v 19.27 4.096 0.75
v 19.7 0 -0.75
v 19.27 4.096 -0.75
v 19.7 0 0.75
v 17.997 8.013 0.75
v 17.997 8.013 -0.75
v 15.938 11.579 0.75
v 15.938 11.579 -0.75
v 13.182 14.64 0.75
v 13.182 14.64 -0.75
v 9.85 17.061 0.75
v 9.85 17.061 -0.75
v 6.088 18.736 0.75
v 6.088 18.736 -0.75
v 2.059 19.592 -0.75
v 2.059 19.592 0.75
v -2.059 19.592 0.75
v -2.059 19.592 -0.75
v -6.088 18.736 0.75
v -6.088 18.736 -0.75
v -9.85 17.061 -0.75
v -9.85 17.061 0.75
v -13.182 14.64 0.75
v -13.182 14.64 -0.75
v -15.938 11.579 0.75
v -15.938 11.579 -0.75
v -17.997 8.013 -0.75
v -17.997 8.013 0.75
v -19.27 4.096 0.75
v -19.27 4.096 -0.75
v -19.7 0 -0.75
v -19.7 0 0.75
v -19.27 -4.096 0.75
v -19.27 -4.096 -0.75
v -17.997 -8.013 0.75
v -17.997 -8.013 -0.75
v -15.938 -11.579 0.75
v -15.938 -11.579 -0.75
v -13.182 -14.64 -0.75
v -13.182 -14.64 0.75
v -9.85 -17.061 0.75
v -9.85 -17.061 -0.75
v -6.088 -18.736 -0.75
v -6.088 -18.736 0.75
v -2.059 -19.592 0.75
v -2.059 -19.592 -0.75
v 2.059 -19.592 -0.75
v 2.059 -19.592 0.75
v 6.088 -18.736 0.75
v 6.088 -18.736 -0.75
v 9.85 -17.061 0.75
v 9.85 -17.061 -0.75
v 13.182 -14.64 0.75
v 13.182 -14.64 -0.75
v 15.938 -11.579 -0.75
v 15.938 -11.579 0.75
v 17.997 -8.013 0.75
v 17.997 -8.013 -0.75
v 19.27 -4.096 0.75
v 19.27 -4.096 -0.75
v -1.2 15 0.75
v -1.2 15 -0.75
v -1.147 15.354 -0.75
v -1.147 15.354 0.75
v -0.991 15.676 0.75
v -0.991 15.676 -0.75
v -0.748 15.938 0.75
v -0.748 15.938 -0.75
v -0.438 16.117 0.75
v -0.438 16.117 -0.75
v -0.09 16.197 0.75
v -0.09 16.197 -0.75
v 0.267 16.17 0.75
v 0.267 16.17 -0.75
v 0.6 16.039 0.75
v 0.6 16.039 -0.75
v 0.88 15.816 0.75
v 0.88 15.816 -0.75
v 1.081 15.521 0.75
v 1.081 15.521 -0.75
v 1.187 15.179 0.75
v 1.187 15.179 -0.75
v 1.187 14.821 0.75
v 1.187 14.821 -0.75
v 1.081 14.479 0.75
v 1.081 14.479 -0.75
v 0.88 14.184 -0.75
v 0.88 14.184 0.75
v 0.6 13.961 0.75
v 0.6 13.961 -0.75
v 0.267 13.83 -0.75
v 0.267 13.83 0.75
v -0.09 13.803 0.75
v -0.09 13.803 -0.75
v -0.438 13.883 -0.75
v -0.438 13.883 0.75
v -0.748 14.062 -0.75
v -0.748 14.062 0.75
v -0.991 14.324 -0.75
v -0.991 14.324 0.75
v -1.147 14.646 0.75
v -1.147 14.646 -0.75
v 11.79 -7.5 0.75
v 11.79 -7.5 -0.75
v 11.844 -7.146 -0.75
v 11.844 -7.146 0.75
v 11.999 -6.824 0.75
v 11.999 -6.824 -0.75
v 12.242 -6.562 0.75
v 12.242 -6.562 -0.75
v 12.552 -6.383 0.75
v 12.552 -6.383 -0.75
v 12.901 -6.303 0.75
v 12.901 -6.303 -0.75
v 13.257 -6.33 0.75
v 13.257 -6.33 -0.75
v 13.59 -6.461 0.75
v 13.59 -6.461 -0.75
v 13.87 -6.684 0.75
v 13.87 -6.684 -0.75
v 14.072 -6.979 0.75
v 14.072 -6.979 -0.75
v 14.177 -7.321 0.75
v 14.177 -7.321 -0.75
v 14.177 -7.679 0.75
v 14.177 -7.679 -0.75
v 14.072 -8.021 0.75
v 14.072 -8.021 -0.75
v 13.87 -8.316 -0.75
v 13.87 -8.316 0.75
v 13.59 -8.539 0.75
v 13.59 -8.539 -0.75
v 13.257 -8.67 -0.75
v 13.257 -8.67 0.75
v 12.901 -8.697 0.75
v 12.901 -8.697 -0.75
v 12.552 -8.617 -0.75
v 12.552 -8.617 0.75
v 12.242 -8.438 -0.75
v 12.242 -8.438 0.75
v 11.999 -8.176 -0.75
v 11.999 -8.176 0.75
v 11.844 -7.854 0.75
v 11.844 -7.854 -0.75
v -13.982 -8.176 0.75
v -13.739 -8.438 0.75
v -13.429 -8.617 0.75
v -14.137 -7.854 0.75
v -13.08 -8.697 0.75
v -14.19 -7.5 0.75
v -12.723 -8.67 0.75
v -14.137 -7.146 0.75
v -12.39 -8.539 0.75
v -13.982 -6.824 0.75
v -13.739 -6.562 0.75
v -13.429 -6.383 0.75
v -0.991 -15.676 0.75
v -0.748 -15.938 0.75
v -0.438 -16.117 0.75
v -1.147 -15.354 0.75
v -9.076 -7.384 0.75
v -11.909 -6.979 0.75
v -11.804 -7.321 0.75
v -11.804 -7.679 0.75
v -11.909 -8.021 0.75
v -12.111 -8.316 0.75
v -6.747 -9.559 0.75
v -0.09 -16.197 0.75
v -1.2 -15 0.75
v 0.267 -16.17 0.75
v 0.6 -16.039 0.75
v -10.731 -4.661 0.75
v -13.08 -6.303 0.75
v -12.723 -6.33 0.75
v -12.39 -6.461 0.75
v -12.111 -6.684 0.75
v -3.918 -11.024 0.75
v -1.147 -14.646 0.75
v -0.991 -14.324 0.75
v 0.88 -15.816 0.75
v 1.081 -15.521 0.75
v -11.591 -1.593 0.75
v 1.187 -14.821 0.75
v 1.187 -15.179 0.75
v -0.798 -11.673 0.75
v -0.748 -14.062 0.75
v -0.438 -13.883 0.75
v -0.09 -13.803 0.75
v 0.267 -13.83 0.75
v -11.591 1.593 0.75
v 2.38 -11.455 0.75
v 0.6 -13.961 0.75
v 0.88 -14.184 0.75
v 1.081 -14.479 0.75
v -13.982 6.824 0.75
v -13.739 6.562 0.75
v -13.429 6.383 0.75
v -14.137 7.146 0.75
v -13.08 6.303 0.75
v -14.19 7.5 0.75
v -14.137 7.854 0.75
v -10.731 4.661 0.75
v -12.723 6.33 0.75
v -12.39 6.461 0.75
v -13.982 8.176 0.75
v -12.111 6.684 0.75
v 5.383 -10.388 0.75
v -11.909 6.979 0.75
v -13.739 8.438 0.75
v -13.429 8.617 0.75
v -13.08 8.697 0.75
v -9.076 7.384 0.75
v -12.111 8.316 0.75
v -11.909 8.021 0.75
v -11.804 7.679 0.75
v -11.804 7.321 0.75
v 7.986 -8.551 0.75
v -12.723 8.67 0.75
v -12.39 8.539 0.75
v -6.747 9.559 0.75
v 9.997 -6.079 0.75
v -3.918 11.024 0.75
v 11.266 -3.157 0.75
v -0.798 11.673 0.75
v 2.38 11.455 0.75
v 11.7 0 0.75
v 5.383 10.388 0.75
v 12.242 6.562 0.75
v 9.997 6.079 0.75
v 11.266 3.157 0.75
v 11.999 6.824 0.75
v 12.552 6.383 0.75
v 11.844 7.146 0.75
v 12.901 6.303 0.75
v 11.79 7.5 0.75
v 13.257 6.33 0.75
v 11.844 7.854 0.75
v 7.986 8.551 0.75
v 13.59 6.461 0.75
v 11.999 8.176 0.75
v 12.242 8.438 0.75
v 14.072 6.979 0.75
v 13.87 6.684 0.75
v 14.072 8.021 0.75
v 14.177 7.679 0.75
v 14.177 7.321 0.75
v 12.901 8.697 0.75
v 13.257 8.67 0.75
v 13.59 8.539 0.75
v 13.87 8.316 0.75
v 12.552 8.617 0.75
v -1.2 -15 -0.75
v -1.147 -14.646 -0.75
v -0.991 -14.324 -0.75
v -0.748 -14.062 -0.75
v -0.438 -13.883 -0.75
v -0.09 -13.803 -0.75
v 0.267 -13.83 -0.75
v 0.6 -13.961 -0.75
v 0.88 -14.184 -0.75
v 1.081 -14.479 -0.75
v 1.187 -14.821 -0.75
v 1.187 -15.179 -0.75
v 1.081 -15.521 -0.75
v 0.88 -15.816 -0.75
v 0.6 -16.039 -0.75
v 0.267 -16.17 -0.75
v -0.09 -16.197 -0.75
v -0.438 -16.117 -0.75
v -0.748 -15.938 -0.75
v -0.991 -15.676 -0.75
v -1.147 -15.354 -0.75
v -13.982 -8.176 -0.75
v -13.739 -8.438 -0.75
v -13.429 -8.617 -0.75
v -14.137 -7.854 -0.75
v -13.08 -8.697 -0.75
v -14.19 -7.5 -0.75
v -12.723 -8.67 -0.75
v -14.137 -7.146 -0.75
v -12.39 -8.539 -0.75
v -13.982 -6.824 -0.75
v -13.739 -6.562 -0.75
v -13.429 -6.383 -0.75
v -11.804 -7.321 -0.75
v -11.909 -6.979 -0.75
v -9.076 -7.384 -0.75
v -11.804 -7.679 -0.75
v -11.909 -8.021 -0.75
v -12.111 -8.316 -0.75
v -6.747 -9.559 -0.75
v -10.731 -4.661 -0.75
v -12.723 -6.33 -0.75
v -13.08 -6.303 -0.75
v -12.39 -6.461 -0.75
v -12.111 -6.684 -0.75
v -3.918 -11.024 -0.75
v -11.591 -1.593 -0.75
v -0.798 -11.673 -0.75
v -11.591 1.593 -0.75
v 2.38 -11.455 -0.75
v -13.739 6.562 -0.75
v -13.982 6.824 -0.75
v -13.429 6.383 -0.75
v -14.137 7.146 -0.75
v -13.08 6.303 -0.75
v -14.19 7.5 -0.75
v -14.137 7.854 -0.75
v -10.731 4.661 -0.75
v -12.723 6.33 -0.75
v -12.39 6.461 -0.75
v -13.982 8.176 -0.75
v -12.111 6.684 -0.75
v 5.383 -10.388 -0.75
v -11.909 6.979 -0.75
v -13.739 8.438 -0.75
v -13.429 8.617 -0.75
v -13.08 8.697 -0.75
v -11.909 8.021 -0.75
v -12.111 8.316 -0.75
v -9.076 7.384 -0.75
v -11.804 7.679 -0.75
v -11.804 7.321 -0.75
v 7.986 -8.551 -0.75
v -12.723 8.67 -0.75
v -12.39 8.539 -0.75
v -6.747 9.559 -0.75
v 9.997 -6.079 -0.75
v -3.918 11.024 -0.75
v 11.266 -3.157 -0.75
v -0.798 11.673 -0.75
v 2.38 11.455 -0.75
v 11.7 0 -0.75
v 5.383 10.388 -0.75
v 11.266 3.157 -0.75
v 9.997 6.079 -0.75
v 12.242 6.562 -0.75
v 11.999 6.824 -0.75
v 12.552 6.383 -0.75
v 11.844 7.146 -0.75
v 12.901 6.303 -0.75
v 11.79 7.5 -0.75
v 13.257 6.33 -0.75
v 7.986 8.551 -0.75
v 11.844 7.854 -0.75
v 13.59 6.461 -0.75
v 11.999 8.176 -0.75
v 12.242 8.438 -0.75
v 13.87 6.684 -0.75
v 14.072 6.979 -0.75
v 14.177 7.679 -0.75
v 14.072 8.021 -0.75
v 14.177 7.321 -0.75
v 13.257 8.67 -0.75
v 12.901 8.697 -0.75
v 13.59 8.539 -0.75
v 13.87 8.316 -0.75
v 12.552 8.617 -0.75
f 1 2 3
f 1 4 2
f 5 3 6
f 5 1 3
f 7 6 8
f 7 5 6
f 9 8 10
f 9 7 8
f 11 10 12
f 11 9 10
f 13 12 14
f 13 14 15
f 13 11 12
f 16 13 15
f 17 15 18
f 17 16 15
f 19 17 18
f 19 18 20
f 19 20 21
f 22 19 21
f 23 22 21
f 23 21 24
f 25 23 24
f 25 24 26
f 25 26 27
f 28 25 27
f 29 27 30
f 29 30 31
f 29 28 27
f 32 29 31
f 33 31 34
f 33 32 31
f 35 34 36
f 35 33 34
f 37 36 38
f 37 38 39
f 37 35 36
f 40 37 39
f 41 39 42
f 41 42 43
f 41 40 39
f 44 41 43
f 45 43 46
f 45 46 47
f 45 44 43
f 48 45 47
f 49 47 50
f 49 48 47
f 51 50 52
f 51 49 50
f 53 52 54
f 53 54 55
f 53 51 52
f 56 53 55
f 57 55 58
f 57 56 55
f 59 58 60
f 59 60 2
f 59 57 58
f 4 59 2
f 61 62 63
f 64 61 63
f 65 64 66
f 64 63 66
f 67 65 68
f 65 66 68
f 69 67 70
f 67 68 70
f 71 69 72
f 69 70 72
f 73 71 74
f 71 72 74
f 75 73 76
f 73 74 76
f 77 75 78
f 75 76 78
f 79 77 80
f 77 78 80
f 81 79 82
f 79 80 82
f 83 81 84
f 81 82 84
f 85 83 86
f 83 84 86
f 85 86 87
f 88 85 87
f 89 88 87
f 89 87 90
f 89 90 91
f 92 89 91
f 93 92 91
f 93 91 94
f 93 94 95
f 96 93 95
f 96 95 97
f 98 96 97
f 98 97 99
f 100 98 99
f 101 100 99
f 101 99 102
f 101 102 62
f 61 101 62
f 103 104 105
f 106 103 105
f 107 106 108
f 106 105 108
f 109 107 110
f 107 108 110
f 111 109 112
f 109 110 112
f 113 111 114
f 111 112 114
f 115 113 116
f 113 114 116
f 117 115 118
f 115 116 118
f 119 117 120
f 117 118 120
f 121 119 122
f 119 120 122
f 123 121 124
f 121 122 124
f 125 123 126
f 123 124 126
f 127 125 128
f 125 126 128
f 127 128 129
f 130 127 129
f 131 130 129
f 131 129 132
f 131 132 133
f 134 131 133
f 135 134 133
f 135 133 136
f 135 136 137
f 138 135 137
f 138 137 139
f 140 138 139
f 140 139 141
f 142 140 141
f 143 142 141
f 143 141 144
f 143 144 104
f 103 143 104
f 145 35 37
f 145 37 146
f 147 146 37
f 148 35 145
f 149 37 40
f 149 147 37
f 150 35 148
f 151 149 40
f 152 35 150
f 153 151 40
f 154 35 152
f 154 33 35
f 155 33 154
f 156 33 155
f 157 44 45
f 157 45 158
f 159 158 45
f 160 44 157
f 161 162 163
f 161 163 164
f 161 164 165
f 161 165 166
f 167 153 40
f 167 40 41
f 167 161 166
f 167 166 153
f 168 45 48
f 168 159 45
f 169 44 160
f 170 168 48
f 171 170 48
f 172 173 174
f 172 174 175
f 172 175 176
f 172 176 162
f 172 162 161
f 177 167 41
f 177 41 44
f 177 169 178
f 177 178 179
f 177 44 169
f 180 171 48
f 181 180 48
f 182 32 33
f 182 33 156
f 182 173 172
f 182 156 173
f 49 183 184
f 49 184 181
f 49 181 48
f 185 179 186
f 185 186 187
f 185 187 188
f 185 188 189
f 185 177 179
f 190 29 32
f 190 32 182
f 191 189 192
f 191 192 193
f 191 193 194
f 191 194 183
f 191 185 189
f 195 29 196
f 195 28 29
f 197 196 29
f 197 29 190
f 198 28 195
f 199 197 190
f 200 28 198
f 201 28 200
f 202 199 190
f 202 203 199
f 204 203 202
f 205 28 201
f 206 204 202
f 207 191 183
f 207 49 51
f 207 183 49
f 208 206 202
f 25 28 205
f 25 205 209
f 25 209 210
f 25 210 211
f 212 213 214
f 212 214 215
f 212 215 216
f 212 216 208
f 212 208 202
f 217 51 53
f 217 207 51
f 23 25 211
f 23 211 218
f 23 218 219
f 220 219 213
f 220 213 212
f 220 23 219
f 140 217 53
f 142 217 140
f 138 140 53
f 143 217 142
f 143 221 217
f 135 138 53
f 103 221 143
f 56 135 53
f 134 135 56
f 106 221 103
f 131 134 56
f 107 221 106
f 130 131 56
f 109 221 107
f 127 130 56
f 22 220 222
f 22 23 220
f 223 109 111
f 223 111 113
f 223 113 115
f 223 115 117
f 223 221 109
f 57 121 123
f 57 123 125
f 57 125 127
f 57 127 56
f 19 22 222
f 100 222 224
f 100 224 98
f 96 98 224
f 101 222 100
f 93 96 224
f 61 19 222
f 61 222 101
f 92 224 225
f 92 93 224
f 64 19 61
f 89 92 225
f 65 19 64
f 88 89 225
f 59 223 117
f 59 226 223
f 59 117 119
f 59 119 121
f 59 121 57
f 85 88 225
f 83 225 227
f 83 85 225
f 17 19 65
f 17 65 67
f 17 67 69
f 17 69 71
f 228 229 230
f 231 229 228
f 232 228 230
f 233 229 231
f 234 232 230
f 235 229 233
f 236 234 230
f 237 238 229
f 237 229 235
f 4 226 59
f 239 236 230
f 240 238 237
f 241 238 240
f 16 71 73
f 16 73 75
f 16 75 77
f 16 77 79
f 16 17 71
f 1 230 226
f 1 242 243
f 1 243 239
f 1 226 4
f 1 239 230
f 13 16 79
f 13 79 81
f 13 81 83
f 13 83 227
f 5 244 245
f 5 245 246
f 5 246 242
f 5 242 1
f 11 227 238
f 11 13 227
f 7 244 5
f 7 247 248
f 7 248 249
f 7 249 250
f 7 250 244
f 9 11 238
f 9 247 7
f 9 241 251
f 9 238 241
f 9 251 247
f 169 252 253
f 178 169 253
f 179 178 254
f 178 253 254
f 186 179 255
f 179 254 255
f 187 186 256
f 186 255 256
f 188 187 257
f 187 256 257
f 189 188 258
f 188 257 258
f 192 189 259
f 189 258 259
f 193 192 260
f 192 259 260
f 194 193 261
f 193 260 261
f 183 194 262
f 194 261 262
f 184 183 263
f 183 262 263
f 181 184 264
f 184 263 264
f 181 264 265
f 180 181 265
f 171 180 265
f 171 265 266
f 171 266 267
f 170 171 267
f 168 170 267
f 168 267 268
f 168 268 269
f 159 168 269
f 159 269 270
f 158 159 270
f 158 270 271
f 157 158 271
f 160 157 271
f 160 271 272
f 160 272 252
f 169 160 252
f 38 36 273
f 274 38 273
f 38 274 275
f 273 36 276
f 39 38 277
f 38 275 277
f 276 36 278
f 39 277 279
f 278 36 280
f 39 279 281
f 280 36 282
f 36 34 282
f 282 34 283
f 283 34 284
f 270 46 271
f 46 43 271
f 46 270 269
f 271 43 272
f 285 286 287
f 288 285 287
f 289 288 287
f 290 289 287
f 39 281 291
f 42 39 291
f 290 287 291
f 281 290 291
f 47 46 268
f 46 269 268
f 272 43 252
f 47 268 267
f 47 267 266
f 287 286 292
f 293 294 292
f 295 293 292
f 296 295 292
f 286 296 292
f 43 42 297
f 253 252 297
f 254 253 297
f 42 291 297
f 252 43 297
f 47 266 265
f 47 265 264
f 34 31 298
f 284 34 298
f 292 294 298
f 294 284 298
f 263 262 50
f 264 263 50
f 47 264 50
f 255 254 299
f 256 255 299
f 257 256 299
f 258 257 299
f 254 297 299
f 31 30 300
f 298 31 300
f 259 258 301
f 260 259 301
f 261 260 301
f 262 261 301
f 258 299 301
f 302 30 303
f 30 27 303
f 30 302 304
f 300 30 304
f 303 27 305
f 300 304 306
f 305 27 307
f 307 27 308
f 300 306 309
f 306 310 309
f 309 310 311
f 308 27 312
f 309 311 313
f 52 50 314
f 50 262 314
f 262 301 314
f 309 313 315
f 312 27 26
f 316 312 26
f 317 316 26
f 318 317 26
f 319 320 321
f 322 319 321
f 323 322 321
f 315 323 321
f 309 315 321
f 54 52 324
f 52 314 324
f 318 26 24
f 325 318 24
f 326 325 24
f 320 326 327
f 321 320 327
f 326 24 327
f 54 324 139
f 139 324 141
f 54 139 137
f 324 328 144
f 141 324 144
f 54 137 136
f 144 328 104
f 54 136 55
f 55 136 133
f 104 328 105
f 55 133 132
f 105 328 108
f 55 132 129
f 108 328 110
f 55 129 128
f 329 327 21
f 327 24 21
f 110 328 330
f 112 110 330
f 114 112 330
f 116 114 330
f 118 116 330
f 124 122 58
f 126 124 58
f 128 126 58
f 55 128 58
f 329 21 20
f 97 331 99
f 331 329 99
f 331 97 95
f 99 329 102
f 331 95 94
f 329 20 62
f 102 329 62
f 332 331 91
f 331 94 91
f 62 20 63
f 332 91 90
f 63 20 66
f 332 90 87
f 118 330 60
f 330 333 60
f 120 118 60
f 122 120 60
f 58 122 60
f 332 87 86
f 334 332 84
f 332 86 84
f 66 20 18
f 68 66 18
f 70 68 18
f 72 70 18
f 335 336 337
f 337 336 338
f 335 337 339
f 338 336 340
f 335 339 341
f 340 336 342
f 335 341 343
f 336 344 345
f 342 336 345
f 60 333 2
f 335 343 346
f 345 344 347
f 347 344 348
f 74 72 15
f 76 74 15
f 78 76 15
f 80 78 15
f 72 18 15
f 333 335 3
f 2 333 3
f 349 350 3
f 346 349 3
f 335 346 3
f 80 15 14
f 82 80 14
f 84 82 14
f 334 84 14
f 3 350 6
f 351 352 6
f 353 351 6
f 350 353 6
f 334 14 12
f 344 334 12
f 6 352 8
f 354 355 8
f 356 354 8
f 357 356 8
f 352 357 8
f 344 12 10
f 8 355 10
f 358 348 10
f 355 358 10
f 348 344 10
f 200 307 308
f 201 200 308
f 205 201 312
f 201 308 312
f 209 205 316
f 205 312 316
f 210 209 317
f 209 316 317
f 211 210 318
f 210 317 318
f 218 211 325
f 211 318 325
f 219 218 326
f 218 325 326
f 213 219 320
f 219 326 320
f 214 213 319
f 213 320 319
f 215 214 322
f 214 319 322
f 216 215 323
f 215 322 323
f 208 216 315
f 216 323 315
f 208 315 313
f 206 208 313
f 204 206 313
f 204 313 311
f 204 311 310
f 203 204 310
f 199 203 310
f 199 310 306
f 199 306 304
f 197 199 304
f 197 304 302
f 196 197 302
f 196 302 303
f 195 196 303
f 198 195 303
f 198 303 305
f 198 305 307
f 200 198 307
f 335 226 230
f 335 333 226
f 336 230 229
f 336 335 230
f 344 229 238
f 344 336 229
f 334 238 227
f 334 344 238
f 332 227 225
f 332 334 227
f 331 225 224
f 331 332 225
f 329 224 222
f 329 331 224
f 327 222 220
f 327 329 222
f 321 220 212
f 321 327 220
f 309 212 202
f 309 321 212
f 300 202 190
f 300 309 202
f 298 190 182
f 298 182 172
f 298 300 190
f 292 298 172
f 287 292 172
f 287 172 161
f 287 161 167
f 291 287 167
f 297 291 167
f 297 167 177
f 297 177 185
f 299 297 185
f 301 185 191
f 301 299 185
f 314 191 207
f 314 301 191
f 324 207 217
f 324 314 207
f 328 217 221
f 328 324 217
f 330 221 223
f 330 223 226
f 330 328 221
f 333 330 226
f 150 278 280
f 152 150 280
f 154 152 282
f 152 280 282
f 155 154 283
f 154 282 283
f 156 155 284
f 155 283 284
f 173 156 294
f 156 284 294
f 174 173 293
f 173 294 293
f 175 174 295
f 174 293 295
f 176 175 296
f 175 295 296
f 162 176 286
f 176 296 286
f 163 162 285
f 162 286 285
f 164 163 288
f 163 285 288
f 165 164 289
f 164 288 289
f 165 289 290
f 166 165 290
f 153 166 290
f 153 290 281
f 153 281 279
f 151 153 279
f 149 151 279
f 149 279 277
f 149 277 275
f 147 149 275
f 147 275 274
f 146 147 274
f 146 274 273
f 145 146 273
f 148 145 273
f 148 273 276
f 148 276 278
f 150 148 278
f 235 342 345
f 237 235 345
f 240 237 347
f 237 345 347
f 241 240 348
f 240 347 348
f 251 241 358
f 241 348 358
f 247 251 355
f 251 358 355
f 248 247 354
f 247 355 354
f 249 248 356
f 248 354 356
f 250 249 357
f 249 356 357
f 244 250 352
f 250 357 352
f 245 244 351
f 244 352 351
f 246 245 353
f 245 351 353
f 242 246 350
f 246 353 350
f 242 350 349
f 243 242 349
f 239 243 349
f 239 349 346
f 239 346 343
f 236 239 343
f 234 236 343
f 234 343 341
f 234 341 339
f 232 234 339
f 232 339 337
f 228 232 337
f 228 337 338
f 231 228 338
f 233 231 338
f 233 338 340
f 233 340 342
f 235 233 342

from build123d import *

# Parameters (mm, degrees)
SKETCH1_R                = 19.7
SKETCH1_R_2              = 11.7
BOSS_EXTRUDE1_DEPTH      = 0.75
M2_CLEARANCE_HOLE1_D     = 2.4
M2_CLEARANCE_HOLE1_DEPTH = 1.5


with BuildPart() as part:
    # Sketch1 → Boss-Extrude1 (new body, symmetric)
    with BuildSketch(Plane.XY):
        Circle(SKETCH1_R)
        Circle(SKETCH1_R_2, mode=Mode.SUBTRACT)
    extrude(amount=BOSS_EXTRUDE1_DEPTH, both=True)

    # M2 Clearance Hole1
    with Locations(Plane.XY.offset(0.75)):
        with Locations((-12.990381057, 7.5), (0, 15), (12.990381057, 7.5), (12.990381057, -7.5), (0, -15), (-12.990381057, -7.5)):
            Hole(M2_CLEARANCE_HOLE1_D / 2, depth=M2_CLEARANCE_HOLE1_DEPTH)


solid = part.part
